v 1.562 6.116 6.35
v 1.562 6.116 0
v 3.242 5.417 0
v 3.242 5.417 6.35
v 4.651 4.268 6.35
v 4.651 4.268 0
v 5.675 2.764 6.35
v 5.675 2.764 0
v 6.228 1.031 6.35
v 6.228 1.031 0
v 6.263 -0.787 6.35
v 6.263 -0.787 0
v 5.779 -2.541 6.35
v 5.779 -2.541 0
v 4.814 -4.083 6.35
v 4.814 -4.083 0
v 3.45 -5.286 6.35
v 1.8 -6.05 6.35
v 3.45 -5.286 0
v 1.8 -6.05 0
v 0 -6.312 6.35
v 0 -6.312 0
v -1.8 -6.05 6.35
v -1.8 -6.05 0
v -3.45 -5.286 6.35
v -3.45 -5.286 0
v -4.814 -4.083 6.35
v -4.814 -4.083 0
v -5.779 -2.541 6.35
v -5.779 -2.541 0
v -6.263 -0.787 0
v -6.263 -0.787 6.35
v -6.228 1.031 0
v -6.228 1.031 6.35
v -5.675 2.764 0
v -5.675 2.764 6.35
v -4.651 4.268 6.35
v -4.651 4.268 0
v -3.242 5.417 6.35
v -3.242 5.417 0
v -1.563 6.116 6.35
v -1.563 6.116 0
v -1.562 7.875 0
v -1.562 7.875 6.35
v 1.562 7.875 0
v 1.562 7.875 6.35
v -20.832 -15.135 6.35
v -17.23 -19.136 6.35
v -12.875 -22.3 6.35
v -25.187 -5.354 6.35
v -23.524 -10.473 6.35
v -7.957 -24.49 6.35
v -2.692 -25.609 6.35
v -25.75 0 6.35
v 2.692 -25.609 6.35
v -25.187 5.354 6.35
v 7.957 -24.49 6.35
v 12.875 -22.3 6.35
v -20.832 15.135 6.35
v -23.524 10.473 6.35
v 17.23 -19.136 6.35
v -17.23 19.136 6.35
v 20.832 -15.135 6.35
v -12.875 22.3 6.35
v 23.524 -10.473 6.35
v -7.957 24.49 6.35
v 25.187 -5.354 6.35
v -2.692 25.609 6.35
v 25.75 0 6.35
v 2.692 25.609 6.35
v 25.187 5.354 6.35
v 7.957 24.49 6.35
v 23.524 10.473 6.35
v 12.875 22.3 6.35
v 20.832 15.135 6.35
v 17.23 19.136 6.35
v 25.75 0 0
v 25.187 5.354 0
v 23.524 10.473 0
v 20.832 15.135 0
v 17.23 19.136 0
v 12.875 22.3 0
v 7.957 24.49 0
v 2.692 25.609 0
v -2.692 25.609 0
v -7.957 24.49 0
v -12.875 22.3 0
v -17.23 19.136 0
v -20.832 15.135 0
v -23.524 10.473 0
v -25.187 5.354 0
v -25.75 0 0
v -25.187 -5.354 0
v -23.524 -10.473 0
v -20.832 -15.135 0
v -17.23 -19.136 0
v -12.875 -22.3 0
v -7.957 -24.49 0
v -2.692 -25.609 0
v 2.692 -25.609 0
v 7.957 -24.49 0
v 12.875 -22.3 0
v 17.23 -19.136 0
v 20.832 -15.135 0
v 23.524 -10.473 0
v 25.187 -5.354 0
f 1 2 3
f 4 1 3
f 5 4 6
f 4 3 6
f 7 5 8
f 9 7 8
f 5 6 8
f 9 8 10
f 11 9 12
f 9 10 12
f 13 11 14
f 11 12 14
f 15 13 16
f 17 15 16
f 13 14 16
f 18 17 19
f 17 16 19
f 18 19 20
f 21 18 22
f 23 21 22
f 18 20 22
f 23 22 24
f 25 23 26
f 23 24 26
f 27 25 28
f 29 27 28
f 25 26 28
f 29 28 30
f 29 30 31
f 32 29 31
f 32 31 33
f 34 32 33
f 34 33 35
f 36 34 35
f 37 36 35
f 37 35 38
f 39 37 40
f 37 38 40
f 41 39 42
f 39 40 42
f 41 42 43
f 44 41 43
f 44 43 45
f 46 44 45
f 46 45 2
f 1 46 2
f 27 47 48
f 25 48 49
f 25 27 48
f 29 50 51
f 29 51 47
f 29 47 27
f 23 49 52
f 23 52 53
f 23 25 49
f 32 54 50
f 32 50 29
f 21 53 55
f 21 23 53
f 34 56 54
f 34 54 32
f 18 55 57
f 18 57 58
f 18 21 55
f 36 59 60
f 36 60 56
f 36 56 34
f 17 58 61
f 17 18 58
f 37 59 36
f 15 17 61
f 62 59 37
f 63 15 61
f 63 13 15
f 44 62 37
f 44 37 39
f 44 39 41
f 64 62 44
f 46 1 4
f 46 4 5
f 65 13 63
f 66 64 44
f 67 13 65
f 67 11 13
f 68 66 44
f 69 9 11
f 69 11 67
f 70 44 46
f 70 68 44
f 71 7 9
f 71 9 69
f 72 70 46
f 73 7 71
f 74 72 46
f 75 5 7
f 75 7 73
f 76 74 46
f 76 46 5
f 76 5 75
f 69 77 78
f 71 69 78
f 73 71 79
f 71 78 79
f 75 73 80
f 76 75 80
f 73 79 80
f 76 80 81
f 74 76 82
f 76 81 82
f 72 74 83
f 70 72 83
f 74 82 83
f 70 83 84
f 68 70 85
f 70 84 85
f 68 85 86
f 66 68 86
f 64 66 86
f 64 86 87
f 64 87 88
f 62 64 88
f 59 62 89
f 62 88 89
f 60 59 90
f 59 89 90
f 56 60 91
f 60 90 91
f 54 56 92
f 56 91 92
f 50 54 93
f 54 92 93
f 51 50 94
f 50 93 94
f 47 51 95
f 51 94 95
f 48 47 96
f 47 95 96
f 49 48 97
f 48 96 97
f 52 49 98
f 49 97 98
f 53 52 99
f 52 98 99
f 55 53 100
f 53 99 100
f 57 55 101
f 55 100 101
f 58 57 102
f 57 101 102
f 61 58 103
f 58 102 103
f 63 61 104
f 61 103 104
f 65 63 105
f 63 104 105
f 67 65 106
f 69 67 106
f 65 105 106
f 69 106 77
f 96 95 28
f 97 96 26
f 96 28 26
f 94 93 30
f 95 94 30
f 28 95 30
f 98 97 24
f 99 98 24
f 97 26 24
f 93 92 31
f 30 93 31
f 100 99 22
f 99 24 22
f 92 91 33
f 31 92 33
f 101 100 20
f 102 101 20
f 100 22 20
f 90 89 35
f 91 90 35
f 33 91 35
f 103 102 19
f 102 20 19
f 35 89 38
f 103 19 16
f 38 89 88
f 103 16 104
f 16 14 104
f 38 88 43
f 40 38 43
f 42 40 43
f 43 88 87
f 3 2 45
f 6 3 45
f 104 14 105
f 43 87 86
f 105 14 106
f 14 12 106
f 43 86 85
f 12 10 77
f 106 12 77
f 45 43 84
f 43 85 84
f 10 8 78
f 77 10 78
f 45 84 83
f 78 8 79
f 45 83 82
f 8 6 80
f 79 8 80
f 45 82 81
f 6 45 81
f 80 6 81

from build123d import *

# Parameters (mm, degrees)
SKETCH1_R           = 25.75
BOSS_EXTRUDE1_DEPTH = 6.35


with BuildPart() as part:
    # Sketch1 → Boss-Extrude1 (new body)
    with BuildSketch(Plane.XY):
        Circle(SKETCH1_R)
        with BuildLine():
            Line((-1.5625, 7.875), (1.5625, 7.875))
            Line((1.5625, 7.875), (1.5625, 6.116064911))
            ThreePointArc((1.5625, 6.116064911), (0, -6.3125), (-1.5625, 6.116064911))
            Line((-1.5625, 6.116064911), (-1.5625, 7.875))
        make_face(mode=Mode.SUBTRACT)
    extrude(amount=BOSS_EXTRUDE1_DEPTH)


solid = part.part
